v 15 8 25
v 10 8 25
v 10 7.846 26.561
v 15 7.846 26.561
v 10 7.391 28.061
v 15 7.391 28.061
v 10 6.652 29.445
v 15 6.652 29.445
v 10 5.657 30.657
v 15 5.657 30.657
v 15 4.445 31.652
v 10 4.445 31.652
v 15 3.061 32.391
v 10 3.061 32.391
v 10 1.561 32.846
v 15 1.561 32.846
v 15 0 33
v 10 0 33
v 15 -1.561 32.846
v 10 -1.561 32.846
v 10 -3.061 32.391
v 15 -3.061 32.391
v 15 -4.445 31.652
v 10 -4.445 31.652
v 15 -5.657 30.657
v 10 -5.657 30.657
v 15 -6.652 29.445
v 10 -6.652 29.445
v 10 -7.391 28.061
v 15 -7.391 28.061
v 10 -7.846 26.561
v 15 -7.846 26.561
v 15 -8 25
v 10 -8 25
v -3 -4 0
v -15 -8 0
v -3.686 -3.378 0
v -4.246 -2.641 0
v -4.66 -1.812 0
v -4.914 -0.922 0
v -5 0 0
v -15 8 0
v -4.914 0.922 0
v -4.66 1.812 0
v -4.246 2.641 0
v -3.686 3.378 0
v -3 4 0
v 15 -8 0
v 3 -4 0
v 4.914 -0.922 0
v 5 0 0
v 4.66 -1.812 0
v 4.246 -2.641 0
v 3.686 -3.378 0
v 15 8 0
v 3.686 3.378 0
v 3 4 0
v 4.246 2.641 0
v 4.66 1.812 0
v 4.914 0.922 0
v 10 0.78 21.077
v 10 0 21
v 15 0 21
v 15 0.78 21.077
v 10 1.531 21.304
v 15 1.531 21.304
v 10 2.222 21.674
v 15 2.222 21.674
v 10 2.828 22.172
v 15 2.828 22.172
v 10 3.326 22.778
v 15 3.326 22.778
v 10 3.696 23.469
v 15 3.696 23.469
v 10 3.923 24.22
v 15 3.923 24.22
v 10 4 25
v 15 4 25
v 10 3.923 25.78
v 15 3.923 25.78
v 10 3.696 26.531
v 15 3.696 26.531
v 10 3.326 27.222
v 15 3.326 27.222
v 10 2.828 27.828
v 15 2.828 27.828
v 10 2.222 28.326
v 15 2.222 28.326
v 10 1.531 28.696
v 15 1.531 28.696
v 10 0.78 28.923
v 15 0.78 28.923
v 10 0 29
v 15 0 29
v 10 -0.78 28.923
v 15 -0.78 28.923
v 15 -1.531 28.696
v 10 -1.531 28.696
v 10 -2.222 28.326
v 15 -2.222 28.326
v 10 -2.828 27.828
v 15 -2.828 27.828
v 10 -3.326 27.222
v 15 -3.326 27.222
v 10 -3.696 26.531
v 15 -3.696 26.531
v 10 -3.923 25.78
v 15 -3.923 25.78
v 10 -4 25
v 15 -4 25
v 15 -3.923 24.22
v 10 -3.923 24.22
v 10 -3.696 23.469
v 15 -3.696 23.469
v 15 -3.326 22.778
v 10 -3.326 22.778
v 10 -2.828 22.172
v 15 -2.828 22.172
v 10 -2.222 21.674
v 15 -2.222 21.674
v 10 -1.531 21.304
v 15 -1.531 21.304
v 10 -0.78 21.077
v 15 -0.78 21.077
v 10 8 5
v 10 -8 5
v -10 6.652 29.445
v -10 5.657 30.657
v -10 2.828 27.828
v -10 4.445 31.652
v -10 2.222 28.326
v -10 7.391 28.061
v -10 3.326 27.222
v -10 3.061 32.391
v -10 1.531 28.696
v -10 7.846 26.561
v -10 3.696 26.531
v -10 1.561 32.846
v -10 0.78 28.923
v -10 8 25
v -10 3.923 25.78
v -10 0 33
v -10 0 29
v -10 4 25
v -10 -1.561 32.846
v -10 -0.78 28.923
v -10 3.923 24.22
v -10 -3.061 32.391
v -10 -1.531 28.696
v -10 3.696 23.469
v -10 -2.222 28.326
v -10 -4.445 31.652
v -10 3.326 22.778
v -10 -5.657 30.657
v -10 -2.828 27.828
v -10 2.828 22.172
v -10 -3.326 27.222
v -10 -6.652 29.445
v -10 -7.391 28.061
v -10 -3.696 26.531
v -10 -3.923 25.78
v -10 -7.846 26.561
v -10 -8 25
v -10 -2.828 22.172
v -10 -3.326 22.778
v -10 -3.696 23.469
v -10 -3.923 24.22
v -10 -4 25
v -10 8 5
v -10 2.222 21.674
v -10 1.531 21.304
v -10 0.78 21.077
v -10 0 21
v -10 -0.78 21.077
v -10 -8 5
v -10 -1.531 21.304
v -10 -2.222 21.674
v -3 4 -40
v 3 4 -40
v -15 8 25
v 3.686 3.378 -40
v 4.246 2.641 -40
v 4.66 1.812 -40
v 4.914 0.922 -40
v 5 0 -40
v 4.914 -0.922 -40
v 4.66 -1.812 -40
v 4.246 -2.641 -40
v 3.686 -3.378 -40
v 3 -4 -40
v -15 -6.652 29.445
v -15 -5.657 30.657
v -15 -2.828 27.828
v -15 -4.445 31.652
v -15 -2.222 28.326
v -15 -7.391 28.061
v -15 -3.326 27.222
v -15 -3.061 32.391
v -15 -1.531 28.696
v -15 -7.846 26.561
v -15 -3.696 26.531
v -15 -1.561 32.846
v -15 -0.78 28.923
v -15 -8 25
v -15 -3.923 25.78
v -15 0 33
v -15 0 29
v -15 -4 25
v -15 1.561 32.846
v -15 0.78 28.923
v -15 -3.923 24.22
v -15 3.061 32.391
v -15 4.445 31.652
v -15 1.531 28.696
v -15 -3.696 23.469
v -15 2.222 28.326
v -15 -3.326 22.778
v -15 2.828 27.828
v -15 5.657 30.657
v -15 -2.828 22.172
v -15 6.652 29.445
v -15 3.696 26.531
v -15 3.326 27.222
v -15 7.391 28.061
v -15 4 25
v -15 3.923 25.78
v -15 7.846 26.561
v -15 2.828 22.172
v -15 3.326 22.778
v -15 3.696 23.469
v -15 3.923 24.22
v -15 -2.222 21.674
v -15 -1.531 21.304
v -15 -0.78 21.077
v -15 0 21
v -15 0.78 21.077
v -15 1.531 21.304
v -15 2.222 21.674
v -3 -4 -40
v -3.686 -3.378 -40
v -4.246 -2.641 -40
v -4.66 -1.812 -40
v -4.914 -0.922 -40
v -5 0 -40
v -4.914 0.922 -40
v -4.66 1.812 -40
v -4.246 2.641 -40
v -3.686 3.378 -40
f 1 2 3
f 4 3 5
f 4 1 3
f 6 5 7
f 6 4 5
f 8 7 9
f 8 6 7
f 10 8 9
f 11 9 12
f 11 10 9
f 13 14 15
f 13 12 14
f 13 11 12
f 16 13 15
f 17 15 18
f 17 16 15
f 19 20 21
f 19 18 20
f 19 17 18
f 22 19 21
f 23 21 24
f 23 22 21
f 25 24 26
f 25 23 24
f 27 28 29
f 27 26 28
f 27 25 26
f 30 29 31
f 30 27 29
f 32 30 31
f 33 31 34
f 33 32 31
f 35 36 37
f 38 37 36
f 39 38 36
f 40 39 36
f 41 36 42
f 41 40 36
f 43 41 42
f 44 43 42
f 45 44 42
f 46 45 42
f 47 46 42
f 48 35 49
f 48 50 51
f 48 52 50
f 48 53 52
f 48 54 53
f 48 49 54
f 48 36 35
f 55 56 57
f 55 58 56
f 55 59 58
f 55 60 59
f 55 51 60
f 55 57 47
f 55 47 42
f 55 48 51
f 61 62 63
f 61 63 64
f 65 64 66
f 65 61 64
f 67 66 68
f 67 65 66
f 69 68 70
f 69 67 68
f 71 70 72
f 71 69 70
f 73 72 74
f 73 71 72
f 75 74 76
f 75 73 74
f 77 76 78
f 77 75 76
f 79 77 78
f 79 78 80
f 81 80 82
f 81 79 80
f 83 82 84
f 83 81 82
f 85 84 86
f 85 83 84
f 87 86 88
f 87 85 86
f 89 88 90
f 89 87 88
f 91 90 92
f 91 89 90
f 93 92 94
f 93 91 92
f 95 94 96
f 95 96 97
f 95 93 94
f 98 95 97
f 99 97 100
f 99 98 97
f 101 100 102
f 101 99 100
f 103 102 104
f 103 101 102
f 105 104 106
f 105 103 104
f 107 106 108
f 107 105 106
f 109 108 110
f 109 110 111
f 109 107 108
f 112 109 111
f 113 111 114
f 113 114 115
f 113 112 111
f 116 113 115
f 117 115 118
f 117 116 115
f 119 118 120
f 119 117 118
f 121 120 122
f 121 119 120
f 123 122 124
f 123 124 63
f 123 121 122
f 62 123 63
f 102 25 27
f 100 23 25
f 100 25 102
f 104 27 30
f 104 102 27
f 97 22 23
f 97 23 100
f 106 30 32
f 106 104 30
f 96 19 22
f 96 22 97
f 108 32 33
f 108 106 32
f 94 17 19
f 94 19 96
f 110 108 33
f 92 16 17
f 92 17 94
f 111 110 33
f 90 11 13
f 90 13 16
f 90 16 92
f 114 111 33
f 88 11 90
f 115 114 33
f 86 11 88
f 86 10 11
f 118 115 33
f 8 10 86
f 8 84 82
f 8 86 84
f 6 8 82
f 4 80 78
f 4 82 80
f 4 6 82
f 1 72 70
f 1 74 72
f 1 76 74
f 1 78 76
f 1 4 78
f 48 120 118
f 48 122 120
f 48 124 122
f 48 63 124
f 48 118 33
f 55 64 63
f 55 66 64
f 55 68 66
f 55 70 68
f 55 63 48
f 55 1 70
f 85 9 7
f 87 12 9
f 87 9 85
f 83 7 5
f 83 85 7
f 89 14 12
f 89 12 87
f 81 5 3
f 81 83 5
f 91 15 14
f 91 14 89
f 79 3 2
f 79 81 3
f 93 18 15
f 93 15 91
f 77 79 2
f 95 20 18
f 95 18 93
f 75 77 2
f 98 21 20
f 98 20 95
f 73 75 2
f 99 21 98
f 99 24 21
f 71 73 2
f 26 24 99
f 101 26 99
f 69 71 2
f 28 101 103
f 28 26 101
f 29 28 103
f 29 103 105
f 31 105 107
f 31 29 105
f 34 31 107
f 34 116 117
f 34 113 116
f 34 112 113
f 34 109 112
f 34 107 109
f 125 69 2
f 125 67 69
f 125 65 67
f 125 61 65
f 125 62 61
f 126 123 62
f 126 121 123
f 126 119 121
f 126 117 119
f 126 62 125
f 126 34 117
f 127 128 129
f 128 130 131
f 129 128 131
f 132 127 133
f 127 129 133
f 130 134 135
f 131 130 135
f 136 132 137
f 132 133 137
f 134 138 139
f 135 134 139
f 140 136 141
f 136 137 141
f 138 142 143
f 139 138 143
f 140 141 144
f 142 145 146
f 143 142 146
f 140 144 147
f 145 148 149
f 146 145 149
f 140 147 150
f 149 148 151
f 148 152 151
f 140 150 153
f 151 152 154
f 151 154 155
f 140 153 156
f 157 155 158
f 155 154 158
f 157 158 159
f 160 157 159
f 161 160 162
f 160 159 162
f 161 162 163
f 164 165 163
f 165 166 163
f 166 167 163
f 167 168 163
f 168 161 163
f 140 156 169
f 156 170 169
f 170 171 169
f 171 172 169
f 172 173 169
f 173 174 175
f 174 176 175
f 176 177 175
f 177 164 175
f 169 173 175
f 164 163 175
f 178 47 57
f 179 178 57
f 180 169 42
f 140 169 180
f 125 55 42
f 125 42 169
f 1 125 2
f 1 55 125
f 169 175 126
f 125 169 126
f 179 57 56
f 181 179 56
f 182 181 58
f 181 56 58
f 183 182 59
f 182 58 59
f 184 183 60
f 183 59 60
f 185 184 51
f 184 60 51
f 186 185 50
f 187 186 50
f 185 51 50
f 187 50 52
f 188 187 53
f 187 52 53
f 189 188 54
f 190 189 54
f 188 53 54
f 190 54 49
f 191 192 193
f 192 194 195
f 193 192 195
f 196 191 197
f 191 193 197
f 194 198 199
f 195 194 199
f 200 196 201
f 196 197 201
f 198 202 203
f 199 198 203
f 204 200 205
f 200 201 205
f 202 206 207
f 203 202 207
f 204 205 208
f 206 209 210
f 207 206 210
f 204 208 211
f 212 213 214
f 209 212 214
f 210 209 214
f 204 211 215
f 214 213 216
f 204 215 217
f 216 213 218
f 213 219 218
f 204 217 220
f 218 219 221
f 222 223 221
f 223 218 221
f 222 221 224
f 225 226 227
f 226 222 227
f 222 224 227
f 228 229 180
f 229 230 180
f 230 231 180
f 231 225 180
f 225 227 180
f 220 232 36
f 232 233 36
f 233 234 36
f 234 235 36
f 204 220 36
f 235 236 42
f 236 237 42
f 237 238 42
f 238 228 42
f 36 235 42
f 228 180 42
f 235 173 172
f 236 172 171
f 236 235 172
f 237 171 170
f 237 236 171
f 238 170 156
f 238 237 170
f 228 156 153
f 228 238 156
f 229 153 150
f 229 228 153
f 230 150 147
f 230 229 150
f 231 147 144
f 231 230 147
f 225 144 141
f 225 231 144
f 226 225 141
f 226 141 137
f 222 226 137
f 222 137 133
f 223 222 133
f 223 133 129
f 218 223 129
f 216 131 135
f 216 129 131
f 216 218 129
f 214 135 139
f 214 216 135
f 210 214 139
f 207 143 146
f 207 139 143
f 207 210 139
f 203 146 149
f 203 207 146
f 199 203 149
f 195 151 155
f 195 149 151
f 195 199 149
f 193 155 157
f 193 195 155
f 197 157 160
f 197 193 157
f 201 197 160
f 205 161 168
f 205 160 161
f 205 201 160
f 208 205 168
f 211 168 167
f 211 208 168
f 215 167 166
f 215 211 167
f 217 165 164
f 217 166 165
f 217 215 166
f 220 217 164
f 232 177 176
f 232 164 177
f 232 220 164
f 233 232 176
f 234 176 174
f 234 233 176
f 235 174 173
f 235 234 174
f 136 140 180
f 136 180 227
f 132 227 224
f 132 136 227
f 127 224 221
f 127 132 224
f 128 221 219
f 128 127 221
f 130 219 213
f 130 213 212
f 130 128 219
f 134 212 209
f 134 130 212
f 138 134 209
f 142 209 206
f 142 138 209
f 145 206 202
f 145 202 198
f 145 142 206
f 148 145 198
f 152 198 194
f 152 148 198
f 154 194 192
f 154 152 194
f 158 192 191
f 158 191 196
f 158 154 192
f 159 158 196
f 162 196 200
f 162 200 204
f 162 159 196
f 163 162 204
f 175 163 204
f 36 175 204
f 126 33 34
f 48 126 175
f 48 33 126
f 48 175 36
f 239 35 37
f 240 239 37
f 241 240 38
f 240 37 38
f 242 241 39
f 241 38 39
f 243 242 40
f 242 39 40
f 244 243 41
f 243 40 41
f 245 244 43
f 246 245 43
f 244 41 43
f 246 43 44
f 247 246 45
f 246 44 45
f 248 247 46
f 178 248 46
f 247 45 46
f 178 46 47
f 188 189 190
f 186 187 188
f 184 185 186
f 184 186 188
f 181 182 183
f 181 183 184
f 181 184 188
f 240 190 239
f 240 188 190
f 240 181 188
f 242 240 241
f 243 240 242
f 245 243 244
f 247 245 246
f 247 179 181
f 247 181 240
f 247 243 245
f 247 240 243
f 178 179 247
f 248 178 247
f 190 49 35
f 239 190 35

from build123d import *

# Parameters (mm, degrees)
SKETCH_2_R               = 4
EXTRUDE_1_DEPTH          = 15
CUT_EXTRUDE_1_DEPTH      = 38.121422387
CUT_EXTRUDE_1_DEPTH_BACK = 38.121422387
SKETCH_3_W               = 20
SKETCH_3_H               = 28
EXTRUDE_2_DEPTH          = 40


with BuildPart() as part:
    # 草图2 → 凸台-拉伸1 (new, symmetric)
    with BuildSketch(Plane(origin=(0, 0, 0), x_dir=(0, 0, -1), z_dir=(1, 0, 0))):
        with BuildLine():
            Line((-25, -8), (0, -8))
            Line((0, -8), (0, 8))
            Line((0, 8), (-25, 8))
            ThreePointArc((-25, 8), (-33, 0), (-25, -8))
        make_face()
        with Locations((-25, 0)):
            Circle(SKETCH_2_R, mode=Mode.SUBTRACT)
    extrude(amount=EXTRUDE_1_DEPTH, both=True)

    # 草图3 → 切除-拉伸1 (cut, two sides: drawn at the far end of the back side and taken through both)
    with BuildSketch(Plane(origin=(0, 0, 0), x_dir=(1, 0, 0), z_dir=(0, 1, 0)).offset(-CUT_EXTRUDE_1_DEPTH_BACK)):
        with Locations((0, -19)):
            Rectangle(SKETCH_3_W, SKETCH_3_H)
    extrude(amount=CUT_EXTRUDE_1_DEPTH + CUT_EXTRUDE_1_DEPTH_BACK, mode=Mode.SUBTRACT)

    # 草图4 → 凸台-拉伸2 (add)
    with BuildSketch(Plane(origin=(0, 0, 0), x_dir=(-1, 0, 0), z_dir=(0, 0, -1))):
        with BuildLine():
            Line((-3, -4), (3, -4))
            ThreePointArc((3, -4), (5, 0), (3, 4))
            Line((3, 4), (-3, 4))
            ThreePointArc((-3, 4), (-5, 0), (-3, -4))
        make_face()
    extrude(amount=EXTRUDE_2_DEPTH)


solid = part.part
